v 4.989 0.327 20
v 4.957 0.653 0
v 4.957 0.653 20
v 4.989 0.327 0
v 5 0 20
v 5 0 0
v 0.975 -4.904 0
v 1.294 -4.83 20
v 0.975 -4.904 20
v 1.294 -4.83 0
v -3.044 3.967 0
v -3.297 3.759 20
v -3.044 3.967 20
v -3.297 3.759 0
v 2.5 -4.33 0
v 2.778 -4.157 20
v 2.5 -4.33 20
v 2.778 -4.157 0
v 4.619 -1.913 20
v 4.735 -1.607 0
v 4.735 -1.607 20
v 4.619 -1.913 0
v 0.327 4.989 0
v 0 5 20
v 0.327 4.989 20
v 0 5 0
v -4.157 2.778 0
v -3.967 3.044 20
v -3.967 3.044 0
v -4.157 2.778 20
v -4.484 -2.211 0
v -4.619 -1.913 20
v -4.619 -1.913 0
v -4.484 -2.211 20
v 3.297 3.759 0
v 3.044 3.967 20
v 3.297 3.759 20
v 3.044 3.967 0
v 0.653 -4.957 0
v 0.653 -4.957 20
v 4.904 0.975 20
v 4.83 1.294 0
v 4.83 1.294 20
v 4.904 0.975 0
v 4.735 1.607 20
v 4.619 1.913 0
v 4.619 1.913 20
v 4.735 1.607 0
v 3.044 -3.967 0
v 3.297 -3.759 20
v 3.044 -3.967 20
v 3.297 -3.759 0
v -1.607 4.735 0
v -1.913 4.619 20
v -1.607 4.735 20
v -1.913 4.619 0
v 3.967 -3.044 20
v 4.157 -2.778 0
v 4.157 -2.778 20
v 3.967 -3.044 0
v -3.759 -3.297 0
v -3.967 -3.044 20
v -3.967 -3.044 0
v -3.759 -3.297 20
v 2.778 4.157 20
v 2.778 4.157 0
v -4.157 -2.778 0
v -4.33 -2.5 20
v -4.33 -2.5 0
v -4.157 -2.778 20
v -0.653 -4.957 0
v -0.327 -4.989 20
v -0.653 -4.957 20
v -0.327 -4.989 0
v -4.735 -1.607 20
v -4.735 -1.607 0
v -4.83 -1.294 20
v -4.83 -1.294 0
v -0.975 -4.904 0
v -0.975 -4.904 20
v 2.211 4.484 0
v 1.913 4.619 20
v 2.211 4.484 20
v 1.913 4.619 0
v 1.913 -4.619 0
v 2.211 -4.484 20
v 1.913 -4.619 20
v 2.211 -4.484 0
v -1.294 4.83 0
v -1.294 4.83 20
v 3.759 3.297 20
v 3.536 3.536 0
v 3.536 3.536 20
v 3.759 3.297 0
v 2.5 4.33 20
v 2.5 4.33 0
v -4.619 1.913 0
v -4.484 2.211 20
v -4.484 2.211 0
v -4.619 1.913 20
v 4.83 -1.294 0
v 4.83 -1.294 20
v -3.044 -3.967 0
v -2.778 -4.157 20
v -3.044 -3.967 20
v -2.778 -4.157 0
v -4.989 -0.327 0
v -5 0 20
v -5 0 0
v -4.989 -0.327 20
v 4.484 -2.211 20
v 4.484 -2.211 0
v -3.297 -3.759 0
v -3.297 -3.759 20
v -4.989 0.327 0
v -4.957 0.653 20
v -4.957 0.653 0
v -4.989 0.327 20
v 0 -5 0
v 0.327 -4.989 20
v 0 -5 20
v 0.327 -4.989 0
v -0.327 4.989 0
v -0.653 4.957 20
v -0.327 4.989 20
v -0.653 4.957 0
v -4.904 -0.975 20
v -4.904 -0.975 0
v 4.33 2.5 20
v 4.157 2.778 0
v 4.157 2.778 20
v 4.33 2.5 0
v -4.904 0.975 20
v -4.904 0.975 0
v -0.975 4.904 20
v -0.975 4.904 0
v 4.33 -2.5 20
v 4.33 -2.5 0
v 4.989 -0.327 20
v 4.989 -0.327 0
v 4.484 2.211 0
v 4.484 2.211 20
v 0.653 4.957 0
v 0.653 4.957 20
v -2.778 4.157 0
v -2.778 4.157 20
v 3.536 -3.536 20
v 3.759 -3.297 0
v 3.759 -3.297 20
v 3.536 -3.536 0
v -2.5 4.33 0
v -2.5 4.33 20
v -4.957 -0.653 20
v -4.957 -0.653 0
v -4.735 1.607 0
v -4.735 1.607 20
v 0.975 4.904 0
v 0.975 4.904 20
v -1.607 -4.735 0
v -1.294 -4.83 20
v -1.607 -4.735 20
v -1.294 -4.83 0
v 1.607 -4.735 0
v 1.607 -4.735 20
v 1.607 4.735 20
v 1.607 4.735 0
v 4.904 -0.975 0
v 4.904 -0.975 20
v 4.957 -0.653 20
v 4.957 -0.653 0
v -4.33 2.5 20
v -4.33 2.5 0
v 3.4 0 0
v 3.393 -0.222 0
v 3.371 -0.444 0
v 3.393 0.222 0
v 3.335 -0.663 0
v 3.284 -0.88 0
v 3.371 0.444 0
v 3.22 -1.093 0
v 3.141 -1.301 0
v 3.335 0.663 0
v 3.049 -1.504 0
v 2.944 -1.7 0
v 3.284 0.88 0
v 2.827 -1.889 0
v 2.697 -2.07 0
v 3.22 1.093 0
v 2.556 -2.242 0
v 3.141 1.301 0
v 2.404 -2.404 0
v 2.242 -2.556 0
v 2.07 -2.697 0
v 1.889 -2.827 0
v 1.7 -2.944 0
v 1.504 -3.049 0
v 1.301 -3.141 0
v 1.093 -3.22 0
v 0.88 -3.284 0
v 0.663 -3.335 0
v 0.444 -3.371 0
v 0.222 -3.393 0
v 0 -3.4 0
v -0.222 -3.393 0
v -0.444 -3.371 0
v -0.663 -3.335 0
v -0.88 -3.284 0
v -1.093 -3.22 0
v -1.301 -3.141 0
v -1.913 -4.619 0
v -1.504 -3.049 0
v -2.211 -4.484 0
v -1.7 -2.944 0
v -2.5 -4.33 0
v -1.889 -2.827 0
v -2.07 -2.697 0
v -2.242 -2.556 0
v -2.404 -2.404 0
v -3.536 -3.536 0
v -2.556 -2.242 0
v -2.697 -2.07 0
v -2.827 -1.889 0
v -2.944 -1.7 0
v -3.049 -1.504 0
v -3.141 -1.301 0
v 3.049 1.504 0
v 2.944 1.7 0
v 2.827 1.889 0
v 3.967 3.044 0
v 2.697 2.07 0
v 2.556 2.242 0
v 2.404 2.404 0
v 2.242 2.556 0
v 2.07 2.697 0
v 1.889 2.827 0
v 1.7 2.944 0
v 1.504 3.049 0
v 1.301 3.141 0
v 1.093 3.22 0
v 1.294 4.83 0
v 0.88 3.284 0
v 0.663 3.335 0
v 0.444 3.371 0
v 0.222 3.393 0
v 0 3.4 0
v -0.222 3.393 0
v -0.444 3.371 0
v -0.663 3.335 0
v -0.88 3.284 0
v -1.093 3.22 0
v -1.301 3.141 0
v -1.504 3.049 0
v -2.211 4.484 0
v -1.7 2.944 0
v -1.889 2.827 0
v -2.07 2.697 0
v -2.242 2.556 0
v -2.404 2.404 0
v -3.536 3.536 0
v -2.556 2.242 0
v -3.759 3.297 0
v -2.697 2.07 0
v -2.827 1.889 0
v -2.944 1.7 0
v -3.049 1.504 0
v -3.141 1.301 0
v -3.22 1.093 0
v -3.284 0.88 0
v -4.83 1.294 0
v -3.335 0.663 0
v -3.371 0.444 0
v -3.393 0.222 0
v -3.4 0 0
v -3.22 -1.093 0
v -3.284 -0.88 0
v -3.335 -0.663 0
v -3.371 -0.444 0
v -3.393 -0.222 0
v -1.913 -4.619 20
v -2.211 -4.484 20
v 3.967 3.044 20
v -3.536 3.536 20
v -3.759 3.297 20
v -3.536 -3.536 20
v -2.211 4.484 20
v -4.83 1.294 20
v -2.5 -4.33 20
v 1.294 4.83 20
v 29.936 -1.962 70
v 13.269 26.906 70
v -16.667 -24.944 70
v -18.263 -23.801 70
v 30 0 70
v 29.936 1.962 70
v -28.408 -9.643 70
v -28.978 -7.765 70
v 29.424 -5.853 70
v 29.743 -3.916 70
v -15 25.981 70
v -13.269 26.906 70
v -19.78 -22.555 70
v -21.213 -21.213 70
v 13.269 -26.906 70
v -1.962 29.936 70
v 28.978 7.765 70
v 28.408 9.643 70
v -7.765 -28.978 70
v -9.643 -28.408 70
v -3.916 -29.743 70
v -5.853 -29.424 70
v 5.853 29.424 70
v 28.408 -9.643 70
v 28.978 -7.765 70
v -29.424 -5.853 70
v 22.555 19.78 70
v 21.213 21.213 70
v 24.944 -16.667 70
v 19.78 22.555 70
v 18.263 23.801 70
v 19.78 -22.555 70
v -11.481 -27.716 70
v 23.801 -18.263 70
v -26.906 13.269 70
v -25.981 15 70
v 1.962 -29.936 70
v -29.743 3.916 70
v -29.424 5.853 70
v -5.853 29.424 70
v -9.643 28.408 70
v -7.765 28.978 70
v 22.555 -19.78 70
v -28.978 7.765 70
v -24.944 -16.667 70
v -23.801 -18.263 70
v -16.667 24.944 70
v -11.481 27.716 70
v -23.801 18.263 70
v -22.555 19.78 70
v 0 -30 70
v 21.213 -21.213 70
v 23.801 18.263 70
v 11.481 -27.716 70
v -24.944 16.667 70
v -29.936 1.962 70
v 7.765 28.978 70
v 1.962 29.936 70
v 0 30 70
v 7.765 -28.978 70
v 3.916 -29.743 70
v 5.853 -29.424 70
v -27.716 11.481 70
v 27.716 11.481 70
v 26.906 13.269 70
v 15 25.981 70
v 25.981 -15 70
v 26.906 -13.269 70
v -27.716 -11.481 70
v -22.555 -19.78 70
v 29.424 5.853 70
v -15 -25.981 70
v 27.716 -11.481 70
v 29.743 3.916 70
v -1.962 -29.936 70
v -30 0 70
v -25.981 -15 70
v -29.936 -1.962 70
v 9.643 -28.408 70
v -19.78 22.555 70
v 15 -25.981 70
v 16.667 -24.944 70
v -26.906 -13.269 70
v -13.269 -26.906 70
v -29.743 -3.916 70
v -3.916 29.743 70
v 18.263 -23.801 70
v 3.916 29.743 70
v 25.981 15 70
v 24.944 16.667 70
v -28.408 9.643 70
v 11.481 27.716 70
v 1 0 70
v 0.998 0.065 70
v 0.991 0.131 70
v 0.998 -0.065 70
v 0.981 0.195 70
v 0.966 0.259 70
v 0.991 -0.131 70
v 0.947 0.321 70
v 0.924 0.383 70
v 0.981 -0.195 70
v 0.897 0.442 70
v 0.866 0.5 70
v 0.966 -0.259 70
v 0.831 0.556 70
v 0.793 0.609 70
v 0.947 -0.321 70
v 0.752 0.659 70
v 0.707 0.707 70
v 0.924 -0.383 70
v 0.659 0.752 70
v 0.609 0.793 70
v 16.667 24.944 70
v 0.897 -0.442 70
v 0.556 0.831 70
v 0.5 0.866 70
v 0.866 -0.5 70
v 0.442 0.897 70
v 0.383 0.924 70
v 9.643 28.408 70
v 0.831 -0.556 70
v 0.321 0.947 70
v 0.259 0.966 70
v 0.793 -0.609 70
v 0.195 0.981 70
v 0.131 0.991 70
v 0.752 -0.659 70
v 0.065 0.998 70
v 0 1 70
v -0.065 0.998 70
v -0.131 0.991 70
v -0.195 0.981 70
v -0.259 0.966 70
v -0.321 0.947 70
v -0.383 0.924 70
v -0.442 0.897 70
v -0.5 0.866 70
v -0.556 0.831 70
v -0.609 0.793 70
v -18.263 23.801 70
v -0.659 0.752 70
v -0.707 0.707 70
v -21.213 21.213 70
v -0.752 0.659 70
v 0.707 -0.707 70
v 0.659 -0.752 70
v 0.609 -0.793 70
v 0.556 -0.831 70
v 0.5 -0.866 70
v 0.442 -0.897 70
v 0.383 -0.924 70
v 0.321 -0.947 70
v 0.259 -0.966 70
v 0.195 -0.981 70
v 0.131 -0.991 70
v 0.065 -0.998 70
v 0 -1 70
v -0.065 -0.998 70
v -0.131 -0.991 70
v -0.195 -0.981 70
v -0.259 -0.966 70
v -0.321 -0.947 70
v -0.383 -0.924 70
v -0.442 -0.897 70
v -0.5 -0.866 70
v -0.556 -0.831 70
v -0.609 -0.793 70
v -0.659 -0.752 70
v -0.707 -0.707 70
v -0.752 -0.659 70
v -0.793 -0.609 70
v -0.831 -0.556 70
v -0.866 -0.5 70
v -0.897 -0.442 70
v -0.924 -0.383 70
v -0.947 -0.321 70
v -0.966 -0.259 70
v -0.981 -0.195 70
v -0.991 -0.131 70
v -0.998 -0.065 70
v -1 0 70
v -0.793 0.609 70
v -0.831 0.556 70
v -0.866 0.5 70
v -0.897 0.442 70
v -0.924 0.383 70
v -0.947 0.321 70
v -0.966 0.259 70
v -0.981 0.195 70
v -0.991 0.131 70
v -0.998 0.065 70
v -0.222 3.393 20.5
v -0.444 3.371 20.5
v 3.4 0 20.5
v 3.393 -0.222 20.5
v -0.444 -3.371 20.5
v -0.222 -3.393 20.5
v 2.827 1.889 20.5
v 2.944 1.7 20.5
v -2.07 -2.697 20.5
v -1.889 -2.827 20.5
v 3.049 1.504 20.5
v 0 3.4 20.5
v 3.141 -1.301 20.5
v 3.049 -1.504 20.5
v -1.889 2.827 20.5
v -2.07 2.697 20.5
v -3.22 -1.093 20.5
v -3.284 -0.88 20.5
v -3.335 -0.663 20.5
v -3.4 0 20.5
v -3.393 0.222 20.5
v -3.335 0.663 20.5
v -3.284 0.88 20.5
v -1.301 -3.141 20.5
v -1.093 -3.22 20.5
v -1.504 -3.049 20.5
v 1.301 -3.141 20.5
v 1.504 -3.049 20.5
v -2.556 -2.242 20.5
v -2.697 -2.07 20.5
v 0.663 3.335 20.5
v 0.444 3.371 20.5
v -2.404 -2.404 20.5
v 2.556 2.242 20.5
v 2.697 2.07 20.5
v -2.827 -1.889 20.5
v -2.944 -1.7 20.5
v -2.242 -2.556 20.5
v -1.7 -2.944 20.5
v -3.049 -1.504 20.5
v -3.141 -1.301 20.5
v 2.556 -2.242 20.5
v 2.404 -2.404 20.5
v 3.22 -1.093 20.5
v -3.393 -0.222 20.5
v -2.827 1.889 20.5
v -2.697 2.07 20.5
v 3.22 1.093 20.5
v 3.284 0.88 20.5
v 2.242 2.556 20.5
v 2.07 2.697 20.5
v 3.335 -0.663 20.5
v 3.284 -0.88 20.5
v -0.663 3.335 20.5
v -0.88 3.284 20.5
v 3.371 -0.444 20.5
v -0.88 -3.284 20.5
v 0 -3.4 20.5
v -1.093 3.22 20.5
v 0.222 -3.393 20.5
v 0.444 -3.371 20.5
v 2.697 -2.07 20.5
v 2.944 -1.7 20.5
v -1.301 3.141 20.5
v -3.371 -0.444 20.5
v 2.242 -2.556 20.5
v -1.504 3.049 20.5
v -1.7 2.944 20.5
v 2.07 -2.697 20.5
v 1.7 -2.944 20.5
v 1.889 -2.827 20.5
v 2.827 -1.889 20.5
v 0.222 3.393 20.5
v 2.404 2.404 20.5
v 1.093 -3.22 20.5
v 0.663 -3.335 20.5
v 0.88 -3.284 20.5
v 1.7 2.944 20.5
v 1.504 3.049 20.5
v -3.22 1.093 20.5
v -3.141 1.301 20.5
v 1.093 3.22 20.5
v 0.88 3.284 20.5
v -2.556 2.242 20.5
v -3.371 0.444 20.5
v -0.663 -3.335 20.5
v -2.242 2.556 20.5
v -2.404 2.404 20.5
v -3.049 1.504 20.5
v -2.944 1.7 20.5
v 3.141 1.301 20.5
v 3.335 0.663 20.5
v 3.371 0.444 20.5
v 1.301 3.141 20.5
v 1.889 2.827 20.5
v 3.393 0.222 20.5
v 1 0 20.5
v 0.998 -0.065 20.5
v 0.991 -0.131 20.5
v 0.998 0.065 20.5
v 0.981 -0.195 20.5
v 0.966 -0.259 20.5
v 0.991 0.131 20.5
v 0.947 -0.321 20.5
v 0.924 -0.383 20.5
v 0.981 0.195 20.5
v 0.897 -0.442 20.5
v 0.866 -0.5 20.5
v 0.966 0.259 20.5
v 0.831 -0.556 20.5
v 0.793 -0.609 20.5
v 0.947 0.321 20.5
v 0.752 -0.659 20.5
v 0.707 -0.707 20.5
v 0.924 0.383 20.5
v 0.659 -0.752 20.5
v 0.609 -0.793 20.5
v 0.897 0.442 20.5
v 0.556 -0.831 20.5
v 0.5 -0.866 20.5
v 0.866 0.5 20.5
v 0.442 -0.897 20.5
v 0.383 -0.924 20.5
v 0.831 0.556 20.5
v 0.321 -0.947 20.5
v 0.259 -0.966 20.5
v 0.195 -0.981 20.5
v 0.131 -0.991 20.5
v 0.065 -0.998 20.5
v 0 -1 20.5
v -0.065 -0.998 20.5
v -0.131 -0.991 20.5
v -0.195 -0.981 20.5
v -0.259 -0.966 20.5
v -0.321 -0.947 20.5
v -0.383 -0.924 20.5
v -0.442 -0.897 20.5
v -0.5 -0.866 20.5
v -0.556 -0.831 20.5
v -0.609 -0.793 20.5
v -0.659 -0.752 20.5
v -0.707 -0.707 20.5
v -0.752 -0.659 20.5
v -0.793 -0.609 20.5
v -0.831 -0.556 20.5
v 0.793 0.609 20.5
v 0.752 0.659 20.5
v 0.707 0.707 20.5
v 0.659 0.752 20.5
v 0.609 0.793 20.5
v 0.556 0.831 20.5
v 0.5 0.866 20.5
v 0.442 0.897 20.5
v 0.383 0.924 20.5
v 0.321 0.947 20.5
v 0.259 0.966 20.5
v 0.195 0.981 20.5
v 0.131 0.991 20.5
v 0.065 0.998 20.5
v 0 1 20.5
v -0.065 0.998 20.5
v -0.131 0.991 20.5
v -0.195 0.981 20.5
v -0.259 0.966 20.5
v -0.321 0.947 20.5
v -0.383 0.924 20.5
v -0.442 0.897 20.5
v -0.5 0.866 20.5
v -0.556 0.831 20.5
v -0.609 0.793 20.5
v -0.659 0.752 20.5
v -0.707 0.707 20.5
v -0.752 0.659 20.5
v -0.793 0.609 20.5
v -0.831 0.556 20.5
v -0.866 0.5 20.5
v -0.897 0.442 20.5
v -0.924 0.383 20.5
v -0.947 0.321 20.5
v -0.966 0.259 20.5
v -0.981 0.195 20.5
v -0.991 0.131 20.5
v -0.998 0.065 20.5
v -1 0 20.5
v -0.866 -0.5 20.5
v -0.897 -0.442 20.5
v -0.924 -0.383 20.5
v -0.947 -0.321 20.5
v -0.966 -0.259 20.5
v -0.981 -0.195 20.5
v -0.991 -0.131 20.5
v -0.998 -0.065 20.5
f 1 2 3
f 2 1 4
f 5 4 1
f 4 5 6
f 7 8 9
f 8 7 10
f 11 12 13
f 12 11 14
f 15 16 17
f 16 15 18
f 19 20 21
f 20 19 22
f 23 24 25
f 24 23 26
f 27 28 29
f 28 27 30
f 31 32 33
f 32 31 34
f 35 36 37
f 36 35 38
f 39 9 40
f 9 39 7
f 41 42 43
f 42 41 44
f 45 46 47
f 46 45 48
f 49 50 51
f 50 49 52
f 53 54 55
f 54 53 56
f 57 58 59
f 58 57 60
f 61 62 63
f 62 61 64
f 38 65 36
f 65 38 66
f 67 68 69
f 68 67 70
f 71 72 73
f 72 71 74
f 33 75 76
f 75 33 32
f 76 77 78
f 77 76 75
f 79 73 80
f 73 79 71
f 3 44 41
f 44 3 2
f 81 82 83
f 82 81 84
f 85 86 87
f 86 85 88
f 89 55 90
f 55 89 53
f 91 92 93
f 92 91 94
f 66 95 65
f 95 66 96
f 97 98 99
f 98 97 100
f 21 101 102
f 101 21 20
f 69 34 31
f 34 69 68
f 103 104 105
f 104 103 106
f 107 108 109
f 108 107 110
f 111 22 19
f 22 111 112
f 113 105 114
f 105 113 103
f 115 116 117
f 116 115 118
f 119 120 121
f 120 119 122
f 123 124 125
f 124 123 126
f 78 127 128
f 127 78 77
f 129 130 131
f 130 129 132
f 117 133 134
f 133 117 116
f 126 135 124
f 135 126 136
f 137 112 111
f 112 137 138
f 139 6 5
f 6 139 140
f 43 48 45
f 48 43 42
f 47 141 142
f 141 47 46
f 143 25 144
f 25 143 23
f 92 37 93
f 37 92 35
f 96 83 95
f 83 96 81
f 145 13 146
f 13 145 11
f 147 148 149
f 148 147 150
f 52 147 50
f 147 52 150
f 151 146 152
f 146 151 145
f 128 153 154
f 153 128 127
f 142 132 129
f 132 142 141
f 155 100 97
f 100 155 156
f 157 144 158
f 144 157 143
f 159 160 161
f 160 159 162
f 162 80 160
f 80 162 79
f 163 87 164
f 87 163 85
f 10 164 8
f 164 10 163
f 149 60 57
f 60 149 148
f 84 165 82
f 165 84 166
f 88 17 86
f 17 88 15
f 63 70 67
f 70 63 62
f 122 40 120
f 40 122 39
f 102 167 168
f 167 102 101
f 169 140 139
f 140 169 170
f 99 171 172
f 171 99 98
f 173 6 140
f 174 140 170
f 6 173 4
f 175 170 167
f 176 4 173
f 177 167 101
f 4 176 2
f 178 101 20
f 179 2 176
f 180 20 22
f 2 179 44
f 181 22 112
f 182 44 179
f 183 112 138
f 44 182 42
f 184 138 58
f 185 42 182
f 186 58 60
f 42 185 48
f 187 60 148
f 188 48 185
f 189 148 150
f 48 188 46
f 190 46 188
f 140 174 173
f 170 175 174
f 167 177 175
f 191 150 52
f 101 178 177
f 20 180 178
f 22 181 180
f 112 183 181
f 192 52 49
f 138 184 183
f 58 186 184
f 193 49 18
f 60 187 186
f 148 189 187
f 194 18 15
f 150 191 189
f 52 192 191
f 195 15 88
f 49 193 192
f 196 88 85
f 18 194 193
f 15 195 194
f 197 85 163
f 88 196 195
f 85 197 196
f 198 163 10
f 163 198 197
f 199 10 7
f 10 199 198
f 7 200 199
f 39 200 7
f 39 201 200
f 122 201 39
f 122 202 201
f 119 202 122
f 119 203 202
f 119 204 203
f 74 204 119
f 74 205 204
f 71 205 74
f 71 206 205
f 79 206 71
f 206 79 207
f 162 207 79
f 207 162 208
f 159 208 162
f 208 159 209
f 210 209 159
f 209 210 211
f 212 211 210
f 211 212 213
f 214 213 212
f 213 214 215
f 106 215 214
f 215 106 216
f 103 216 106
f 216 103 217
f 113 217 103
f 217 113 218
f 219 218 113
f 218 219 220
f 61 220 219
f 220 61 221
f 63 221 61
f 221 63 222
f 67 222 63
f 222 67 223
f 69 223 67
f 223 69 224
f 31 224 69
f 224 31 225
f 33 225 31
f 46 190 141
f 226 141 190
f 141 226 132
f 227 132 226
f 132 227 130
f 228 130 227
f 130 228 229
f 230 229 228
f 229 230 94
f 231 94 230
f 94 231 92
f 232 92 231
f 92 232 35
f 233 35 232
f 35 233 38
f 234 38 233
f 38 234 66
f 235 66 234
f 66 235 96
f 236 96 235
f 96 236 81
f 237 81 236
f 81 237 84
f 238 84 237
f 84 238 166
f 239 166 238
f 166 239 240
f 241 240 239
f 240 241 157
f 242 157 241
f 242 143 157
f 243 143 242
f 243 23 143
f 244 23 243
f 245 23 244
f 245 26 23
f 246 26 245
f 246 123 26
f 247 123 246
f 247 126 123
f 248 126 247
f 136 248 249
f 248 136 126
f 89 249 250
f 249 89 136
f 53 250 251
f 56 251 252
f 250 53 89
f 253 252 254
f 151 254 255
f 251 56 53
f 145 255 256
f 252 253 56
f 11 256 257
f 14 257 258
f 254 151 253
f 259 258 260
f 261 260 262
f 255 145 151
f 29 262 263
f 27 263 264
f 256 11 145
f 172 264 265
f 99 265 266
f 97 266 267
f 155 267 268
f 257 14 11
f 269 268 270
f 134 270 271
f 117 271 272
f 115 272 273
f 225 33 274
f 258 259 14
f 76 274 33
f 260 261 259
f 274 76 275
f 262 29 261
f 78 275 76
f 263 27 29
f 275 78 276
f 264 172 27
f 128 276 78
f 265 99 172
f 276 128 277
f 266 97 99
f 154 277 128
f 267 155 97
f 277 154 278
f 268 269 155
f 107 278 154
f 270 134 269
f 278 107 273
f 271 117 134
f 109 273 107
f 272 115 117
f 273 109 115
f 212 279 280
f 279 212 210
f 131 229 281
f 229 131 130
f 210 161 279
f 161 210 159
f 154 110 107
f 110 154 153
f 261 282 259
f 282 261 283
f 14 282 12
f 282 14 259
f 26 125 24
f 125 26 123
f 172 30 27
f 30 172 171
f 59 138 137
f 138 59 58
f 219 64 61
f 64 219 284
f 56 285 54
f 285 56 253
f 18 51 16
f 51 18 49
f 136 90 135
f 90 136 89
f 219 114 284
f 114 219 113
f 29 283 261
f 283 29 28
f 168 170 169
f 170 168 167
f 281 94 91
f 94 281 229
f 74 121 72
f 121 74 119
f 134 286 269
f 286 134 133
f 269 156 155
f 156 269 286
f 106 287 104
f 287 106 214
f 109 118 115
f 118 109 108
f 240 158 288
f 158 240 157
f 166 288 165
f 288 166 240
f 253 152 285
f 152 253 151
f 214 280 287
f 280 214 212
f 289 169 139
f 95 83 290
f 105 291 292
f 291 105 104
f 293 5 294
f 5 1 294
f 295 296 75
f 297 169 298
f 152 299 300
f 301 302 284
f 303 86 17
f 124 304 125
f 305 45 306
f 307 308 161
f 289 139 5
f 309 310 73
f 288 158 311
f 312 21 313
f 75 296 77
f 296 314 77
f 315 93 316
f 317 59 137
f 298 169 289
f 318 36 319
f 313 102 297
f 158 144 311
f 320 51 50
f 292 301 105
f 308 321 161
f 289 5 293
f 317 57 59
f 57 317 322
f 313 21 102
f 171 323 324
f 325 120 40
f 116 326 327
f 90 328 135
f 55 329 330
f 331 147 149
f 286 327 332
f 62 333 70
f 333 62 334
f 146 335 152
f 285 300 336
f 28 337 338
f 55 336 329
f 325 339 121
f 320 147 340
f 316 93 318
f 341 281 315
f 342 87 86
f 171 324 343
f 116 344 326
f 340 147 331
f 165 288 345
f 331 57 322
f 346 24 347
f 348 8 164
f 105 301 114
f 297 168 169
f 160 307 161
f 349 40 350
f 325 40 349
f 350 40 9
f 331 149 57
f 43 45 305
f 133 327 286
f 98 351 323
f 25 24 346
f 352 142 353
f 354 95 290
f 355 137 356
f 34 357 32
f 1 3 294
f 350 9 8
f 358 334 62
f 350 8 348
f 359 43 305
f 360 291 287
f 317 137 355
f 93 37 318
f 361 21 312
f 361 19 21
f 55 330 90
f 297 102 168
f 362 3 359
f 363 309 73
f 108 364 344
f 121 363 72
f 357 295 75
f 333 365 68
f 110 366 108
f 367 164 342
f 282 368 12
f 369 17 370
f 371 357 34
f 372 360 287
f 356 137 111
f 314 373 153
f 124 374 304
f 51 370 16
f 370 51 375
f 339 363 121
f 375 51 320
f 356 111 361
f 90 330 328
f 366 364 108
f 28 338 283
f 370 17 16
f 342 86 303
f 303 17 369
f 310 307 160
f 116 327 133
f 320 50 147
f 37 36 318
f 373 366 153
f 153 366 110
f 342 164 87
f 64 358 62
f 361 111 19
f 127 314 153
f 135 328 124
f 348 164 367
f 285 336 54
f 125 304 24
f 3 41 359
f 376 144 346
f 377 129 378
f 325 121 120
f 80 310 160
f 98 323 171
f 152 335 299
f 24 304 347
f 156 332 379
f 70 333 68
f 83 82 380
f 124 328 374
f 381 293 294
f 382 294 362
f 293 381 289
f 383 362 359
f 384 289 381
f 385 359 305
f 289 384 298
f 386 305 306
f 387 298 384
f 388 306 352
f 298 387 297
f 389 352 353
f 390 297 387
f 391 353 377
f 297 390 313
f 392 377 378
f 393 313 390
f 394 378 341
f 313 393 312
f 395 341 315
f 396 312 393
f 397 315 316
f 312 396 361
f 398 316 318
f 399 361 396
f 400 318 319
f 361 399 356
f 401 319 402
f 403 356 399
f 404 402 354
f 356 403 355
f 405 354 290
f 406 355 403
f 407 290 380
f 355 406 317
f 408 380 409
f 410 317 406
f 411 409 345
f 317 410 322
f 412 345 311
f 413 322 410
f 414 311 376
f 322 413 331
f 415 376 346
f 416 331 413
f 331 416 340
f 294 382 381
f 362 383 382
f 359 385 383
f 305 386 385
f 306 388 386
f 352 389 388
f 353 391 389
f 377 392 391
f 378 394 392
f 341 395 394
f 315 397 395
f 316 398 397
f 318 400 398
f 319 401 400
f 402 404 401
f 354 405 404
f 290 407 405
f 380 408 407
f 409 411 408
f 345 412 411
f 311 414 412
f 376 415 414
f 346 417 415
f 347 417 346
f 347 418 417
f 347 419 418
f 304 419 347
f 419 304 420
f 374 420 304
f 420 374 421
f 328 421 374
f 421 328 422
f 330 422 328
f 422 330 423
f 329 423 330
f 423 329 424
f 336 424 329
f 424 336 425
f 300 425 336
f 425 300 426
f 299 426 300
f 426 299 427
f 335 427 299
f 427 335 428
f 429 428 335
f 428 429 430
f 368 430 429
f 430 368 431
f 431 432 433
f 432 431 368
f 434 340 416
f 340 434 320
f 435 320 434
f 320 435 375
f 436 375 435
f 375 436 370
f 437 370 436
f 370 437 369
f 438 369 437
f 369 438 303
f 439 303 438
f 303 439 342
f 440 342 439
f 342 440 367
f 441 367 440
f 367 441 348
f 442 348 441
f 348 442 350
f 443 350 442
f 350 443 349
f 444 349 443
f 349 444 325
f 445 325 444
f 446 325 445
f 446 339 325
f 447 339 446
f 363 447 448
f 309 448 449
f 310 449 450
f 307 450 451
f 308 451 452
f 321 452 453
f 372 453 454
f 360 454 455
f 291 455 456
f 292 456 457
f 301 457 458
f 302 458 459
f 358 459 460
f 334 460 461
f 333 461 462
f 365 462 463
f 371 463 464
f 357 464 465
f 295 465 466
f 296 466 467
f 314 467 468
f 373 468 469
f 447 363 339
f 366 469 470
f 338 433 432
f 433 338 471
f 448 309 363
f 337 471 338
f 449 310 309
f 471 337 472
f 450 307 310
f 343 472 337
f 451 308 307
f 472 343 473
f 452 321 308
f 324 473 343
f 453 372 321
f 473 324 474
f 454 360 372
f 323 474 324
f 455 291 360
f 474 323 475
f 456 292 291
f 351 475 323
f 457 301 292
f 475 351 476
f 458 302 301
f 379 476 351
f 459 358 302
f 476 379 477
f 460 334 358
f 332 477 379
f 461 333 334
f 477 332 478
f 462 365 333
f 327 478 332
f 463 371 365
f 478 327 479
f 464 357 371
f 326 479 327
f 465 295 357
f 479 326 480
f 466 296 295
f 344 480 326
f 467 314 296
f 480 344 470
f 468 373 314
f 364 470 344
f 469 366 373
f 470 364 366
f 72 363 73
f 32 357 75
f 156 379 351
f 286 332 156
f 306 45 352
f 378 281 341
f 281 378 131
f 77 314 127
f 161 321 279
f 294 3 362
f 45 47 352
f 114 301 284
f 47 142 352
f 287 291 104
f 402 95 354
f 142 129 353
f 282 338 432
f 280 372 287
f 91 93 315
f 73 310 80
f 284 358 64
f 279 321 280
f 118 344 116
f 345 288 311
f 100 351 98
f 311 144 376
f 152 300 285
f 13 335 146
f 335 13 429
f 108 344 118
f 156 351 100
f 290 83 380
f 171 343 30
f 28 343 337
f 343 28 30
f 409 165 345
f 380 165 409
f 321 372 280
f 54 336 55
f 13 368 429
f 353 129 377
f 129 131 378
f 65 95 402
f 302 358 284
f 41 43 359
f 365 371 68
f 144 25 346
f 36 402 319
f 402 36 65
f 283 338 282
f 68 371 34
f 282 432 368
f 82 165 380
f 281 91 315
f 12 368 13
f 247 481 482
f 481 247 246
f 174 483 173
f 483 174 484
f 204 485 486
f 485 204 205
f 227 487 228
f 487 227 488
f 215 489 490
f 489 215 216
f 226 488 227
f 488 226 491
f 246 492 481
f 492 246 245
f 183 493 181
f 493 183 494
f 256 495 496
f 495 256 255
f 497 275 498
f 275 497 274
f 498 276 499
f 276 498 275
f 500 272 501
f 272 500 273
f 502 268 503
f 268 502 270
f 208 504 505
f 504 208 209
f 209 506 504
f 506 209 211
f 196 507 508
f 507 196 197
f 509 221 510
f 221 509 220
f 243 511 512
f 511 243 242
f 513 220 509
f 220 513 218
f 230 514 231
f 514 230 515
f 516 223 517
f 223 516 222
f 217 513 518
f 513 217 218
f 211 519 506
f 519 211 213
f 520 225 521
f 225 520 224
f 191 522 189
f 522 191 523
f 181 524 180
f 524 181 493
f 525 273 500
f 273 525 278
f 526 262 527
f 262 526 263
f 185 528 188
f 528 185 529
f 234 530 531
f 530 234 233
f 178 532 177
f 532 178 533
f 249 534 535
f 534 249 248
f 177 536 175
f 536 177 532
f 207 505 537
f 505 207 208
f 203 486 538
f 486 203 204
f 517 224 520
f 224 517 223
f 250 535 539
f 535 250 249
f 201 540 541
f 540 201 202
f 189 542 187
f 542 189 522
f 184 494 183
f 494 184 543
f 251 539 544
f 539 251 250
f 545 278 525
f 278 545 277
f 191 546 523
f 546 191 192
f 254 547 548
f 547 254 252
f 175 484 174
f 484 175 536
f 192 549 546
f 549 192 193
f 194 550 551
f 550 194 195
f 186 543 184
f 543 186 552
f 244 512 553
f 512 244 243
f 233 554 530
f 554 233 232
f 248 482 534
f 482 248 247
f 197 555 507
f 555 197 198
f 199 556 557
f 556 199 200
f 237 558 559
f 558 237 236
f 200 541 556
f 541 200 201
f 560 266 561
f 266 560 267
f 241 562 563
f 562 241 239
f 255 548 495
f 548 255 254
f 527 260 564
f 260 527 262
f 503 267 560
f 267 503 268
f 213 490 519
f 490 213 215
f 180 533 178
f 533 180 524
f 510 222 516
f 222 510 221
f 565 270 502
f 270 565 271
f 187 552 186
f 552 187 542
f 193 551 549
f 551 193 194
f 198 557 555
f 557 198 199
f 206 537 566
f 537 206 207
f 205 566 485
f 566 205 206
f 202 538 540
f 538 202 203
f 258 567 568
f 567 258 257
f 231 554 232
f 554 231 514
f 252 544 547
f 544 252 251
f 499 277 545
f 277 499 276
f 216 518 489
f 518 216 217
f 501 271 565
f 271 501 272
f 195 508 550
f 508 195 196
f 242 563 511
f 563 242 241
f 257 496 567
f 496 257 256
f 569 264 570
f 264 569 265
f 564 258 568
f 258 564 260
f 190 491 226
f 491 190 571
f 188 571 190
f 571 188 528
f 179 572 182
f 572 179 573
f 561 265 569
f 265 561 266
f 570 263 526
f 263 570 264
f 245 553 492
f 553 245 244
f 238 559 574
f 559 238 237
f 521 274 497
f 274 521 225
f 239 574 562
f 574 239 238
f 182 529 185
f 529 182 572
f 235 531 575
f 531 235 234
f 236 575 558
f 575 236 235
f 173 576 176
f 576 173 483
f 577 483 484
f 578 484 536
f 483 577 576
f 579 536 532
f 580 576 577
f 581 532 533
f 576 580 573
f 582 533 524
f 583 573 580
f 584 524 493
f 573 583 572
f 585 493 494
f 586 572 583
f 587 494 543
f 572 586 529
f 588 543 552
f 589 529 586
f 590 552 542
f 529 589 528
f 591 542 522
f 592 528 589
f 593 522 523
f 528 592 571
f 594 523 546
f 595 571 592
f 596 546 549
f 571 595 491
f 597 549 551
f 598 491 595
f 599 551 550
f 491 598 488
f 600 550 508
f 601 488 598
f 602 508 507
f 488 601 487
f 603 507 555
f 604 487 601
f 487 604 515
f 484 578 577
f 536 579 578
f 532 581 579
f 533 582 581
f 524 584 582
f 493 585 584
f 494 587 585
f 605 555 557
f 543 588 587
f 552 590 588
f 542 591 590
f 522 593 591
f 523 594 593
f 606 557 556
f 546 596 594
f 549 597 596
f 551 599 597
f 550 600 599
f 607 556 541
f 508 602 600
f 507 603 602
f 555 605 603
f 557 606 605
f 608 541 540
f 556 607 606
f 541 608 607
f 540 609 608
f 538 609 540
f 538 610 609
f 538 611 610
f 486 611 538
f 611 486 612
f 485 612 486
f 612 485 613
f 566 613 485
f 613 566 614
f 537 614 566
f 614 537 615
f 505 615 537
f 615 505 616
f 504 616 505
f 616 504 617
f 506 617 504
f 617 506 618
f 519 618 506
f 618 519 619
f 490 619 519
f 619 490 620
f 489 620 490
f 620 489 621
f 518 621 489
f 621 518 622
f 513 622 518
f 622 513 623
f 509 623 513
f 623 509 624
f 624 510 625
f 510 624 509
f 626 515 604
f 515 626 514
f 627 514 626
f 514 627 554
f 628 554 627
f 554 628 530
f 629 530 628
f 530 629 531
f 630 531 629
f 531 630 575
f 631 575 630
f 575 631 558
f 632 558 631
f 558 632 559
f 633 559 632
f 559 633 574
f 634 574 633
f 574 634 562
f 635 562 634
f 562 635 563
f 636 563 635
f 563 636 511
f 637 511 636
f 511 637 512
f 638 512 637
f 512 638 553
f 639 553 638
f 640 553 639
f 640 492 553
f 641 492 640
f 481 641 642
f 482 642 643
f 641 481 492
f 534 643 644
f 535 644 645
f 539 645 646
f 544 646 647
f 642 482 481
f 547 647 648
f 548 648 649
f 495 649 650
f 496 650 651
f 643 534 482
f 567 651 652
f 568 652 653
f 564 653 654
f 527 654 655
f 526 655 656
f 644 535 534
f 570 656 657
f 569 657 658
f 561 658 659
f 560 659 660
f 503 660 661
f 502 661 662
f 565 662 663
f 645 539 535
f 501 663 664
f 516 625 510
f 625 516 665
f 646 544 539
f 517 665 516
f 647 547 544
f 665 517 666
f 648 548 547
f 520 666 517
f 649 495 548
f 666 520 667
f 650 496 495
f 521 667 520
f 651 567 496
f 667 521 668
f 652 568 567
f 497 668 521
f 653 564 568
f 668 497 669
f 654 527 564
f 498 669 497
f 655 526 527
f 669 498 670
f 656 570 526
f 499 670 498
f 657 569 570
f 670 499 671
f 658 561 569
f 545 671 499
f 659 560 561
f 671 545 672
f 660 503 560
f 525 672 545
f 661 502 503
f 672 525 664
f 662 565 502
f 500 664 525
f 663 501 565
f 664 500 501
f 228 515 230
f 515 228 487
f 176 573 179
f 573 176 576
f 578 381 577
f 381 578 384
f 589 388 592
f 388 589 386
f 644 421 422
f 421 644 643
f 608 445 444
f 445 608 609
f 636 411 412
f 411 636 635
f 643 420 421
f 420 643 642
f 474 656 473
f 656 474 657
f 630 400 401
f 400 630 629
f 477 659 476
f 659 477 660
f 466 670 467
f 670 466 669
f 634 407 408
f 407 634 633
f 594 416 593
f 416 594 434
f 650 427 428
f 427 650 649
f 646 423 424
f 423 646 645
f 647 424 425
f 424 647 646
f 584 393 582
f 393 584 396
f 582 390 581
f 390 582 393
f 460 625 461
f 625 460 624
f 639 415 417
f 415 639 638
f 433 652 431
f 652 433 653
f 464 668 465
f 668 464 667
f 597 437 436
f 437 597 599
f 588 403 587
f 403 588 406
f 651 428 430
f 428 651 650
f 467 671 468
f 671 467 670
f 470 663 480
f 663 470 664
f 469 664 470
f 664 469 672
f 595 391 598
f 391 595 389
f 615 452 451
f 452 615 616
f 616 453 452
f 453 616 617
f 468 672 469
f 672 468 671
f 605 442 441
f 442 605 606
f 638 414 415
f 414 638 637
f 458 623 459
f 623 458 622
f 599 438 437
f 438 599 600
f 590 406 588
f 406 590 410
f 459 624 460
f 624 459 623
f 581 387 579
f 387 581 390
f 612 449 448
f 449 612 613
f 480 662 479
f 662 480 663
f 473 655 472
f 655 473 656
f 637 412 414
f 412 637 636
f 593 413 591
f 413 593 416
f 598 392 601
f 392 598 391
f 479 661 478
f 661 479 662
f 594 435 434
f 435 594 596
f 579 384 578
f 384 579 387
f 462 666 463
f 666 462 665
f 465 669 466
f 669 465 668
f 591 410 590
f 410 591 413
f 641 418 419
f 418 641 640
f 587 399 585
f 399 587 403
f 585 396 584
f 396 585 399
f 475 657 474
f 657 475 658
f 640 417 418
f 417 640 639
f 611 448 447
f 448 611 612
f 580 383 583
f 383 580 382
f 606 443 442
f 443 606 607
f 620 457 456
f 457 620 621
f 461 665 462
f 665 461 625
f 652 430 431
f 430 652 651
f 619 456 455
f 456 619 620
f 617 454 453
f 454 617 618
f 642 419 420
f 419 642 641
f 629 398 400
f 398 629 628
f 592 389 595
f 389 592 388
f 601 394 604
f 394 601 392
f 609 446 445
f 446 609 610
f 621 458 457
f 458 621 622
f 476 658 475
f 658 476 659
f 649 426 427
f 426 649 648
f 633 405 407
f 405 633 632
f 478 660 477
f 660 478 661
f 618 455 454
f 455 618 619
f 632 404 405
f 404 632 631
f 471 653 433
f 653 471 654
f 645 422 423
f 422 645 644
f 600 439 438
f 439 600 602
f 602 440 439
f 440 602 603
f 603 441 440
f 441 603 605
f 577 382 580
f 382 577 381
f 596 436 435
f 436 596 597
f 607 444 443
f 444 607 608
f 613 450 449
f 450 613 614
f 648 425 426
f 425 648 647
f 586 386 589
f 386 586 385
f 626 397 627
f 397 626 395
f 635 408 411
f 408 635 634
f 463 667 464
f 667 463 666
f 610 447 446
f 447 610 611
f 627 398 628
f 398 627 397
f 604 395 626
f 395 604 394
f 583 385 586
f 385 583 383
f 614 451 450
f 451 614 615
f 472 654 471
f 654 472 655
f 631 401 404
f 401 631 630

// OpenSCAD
// Funnel with straight spout - printed upright, wide opening at top
// Units: mm. Wall thickness: 1.6 mm throughout.

// ---- Parameters ----
spout_od      = 10;    // spout outer diameter
spout_bore    = spout_od - 2 * 1.6;  // spout bore (6.8 mm)
spout_length  = 20;    // spout length (z = 0 to 20)
cone_start_d  = 10;    // cone outer diameter at z = 20
cone_end_d    = 60;    // cone outer diameter at rim (z = 50)
wall          = 1.6;   // wall thickness
eps           = 0.5;   // cutter overshoot past faces

$fn = 96;

// ---- Model ----
difference() {
    union() {
        // Spout (solid)
        cylinder(h = spout_length, d = spout_od);
        // Cone (solid)
        translate([0, 0, spout_length])
            cylinder(h = cone_end_d - cone_start_d,
                     d1 = cone_start_d,
                     d2 = cone_end_d);
    }
    // Through-bore: spout bore up to z=20, then a slightly larger
    // bore that widens with the cone so the inner walls are exactly
    // wall thickness away from the outer surface.
    translate([0, 0, -eps])
        linear_extrude(height = spout_length + 2 * eps)
            circle(d = spout_bore);
    translate([0, 0, spout_length - eps])
        linear_extrude(height = (cone_end_d - cone_start_d) + 2 * eps)
            circle(d1 = cone_start_d - 2 * wall,
                    d2 = cone_end_d - 2 * wall);
}
